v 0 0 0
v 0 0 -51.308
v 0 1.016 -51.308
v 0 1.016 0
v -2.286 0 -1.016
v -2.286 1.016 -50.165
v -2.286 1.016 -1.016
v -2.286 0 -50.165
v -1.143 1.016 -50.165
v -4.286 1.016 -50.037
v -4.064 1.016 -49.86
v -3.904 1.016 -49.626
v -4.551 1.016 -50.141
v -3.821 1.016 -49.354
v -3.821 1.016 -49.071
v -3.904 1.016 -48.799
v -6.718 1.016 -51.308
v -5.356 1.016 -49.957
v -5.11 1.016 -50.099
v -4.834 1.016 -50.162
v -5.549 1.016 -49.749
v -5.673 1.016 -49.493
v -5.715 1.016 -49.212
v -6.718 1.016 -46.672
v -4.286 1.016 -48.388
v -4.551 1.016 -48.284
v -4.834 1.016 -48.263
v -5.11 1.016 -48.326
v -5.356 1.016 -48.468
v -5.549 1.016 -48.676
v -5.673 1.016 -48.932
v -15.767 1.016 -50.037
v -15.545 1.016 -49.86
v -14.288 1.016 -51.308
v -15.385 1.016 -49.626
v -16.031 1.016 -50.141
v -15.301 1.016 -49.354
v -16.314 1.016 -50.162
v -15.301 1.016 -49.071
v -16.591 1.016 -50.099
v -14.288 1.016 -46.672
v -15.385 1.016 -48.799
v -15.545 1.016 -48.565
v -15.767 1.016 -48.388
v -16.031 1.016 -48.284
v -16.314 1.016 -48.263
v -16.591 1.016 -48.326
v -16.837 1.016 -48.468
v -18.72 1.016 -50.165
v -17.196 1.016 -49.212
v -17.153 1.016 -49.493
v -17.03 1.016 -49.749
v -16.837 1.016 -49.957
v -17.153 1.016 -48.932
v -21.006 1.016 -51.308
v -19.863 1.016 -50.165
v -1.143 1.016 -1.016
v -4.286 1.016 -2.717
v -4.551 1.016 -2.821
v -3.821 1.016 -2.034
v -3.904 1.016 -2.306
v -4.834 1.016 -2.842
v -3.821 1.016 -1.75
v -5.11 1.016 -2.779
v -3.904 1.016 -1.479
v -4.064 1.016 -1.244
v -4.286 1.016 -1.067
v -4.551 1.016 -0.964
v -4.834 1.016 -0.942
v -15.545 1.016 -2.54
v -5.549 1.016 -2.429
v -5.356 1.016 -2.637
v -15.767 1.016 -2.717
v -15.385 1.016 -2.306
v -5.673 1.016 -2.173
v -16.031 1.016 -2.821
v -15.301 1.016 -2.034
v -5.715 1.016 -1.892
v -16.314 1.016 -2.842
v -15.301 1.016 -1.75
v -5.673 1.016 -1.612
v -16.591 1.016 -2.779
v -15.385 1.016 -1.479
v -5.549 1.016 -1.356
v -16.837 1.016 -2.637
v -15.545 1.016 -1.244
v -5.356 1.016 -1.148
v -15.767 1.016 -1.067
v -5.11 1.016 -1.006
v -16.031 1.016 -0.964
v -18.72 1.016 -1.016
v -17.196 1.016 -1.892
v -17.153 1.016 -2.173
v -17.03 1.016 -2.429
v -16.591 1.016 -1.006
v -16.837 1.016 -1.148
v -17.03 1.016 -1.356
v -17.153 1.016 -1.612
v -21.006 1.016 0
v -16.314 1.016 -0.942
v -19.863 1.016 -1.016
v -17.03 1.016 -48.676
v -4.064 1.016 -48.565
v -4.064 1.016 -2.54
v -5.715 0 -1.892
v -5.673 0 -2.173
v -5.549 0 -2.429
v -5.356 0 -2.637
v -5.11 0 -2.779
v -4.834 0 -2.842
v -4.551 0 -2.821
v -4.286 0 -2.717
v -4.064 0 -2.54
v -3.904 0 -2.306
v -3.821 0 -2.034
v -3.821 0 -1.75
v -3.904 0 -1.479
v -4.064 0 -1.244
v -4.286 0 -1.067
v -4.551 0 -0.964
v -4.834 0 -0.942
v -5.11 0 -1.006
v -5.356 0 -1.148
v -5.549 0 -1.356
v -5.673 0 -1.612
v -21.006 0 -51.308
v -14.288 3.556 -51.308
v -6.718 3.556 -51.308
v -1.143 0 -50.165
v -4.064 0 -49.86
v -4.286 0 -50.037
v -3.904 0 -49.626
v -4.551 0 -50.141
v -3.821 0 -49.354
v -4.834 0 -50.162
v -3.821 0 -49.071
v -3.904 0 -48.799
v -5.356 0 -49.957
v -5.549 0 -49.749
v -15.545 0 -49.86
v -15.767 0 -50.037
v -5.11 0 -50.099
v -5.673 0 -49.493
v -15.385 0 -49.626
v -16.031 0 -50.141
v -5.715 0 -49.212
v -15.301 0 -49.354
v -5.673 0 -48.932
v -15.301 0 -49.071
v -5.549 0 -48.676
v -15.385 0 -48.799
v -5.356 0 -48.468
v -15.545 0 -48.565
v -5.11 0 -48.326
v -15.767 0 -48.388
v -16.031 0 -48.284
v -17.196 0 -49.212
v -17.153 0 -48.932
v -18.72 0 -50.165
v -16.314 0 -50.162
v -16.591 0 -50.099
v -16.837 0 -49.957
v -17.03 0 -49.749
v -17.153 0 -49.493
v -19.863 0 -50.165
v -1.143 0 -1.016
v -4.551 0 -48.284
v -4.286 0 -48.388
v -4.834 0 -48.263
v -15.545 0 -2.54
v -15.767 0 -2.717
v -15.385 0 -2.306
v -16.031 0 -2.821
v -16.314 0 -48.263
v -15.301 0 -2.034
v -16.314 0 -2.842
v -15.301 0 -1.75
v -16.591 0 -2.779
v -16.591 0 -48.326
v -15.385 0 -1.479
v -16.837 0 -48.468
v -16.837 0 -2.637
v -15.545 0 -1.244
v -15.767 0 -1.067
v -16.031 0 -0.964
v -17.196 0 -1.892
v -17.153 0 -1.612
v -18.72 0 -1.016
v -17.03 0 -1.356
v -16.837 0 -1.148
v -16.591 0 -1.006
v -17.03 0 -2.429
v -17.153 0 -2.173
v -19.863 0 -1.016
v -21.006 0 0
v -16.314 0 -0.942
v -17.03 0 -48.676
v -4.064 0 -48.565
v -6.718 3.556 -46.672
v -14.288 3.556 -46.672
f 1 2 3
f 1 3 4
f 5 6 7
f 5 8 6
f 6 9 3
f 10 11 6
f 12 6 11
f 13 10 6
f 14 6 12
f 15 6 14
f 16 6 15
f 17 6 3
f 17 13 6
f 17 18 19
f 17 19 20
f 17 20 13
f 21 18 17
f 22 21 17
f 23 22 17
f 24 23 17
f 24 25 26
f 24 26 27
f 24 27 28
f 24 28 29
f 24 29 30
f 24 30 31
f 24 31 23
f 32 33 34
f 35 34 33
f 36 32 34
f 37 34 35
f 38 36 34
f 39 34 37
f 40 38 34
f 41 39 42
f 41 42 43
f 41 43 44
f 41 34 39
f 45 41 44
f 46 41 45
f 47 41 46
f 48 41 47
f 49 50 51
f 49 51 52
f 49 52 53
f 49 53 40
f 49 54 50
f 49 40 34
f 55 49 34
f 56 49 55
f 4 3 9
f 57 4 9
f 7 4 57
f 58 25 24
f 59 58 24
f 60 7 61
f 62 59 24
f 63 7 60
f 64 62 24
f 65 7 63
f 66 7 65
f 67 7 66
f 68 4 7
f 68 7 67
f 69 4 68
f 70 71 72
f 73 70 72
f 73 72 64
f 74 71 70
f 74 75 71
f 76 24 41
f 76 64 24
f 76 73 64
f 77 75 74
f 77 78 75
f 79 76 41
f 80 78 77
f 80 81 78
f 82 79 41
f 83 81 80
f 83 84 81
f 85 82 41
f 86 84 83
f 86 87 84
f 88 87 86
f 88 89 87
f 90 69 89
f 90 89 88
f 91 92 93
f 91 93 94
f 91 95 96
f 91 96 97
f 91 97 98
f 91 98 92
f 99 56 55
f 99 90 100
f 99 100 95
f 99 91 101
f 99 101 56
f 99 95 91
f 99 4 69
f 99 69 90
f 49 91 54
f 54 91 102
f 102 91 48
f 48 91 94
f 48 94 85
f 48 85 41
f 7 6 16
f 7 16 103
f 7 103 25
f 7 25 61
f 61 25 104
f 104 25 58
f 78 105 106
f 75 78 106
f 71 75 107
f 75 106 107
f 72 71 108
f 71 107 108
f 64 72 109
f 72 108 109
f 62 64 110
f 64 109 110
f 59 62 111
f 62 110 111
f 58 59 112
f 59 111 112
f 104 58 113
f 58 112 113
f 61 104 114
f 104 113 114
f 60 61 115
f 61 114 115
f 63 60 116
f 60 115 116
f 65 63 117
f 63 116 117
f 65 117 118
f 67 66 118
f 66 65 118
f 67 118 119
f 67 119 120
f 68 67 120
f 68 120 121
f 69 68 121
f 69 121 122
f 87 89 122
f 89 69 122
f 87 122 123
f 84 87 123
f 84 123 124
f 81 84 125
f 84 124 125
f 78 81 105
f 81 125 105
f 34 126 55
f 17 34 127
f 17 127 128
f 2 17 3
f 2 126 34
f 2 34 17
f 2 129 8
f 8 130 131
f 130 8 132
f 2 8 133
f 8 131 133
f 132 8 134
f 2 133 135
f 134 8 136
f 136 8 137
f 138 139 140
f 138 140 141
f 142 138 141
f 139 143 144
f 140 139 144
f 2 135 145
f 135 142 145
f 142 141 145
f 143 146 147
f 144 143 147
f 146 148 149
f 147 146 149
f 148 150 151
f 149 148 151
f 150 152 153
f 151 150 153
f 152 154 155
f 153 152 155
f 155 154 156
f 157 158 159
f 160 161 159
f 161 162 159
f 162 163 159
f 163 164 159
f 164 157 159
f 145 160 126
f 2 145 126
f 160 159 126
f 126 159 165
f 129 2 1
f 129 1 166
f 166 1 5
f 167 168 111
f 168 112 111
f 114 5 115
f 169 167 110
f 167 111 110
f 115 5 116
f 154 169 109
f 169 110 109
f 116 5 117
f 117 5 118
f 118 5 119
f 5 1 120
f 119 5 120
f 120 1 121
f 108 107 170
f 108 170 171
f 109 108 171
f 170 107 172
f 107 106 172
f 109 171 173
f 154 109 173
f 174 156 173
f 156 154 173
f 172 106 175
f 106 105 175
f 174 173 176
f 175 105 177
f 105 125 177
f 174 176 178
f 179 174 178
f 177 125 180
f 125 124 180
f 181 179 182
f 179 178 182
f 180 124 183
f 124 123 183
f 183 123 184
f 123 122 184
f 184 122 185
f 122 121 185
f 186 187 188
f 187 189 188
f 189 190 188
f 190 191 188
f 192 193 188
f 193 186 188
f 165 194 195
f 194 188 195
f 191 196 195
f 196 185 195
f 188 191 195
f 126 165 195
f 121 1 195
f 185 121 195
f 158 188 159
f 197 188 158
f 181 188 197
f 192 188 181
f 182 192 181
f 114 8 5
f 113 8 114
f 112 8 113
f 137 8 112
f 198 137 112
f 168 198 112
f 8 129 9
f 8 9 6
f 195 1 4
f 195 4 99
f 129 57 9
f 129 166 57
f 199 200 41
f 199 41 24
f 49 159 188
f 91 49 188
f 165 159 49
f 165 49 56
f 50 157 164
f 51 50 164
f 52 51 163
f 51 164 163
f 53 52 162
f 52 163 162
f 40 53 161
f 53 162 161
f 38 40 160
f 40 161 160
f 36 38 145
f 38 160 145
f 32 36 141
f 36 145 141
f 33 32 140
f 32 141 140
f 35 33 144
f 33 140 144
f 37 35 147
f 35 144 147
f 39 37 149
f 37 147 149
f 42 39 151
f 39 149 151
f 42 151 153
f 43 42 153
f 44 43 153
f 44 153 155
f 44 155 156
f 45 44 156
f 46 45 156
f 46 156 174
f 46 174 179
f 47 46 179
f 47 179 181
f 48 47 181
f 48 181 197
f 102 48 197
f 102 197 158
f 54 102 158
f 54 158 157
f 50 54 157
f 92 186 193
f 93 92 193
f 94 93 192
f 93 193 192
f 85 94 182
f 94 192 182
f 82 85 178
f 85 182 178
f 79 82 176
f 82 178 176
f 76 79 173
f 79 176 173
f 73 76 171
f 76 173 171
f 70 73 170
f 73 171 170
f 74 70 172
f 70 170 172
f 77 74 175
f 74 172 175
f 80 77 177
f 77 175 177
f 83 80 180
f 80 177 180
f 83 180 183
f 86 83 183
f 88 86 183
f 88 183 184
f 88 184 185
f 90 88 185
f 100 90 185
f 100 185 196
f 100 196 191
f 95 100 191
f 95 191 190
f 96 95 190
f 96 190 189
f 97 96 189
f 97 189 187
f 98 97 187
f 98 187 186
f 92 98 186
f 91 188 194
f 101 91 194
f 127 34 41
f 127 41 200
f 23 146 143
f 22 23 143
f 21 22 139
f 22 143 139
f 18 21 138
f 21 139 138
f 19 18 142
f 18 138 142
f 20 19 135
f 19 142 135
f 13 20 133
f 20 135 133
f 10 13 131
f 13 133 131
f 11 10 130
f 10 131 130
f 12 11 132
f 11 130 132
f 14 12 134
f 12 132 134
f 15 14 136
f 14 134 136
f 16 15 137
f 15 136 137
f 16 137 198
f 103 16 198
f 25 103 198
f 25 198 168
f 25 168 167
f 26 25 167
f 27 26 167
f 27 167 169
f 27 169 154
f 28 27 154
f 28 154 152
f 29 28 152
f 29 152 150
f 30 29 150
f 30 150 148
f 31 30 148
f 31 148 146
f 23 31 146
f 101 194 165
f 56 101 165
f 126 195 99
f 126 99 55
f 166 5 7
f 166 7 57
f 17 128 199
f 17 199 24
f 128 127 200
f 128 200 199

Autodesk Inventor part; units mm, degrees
ref_plane "YZ Plane" through (0, 0, 0) normal (1, 0, 0) x (0, 1, 0)
ref_plane "XZ Plane" through (0, 0, 0) normal (0, 1, 0) x (-1, 0, 0)
ref_plane "XY Plane" through (0, 0, 0) normal (0, 0, 1) x (1, 0, 0)
sketch "Sketch1" plane through (0, 0, 0) normal (0, 1, 0) x (-1, 0, 0)
  line L0 (0, 0) -> (21.0058, 0)
  line L1 (21.0058, 0) -> (21.0058, -51.308)
  line L2 (21.0058, -51.308) -> (0, -51.308)
  line L3 (0, -51.308) -> (0, 0)
  line L4 (21.0058, -51.308) -> (19.8628, -51.308)
  line L5 (19.8628, -51.308) -> (19.8628, -50.292)
  line L6 (19.8628, -50.292) -> (21.0058, -50.292)
  line L7 (21.0058, -50.292) -> (21.0058, -51.308)
  line L8 (21.0058, -25.654) -> (0, -25.654)
  line L9 (10.5029, -51.308) -> (10.5029, 0)
  line L10 (19.8628, 0) -> (19.8628, -1.016)
  line L11 (19.8628, -1.016) -> (21.0058, -1.016)
  line L12 (1.143, -51.308) -> (1.143, -50.292)
  line L13 (1.143, -50.292) -> (0, -50.292)
  line L14 (1.143, -1.016) -> (0, -1.016)
  line L15 (1.143, 0) -> (1.143, -1.016)
  line L16 (19.8628, -1.016) -> (19.8628, -50.292)
  line L17 (19.8628, -50.292) -> (18.7198, -50.292)
  line L18 (18.7198, -50.292) -> (18.7198, -1.016)
  line L19 (18.7198, -1.016) -> (19.8628, -1.016)
  line L20 (1.143, -1.016) -> (1.143, -50.292)
  line L21 (1.143, -50.292) -> (2.286, -50.292)
  line L22 (2.286, -50.292) -> (2.286, -1.016)
  line L23 (2.286, -1.016) -> (1.143, -1.016)
  line L24 (21.0058, 0) -> (17.1958, 0)
  line L25 (17.1958, 0) -> (17.1958, -0.9398)
  line L26 (17.1958, -0.9398) -> (21.0058, -0.9398)
  line L27 (21.0058, -0.9398) -> (21.0058, 0)
  line L28 (17.1958, -0.9398) -> (15.2908, -0.9398)
  line L29 (15.2908, -0.9398) -> (15.2908, -2.8448)
  line L30 (15.2908, -2.8448) -> (17.1958, -2.8448)
  line L31 (17.1958, -2.8448) -> (17.1958, -0.9398)
  circle A0 centre (16.2433, -1.8923) radius 0.9525
  circle A1 centre (4.7625, -1.8923) radius 0.9525
  line L32 (21.0058, -51.308) -> (0, -51.308)
  line L33 (0, -51.308) -> (0, -50.165)
  line L34 (0, -50.165) -> (21.0058, -50.165)
  line L35 (21.0058, -50.165) -> (21.0058, -51.308)
  line L36 (21.0058, -50.165) -> (17.1958, -50.165)
  line L37 (17.1958, -50.165) -> (15.2908, -50.165)
  line L38 (15.2908, -50.165) -> (15.2908, -48.26)
  line L39 (15.2908, -48.26) -> (17.1958, -48.26)
  line L40 (17.1958, -48.26) -> (17.1958, -50.165)
  circle A2 centre (16.2433, -49.2125) radius 0.9525
  circle A3 centre (4.7625, -49.2125) radius 0.9525
  point P0 (19.8628, -50.165)
  point P1 (18.7198, -50.165)
  point P2 (2.286, -50.165)
  point P3 (1.143, -50.165)
  dimension "d0" = 21.0058
  dimension "d1" = 51.308
  dimension "d2" = 1.143
  dimension "d3" = 1.016
  dimension "d4" = 1.143
  dimension "d7" = 3.81
  dimension "d8" = 0.9398
  dimension "d9" = 1.905
  dimension "d10" = 1.905
  dimension "d11" = 1.143
  dimension "d12" = 3.81
  dimension "d13" = 1.905
  dimension "d14" = 1.905
extrude "Extrusion1" add sketch "Sketch1" along normal blind 1.016 contours L0 L15 L14 L3 | L0 L9 L8 L22 L23 L15 | L14 L20 L8 L3 | L31 A0 L28 | L0 L25 L26 L10 L19 L18 L8 L9 | L8 L20 L34 L3 | L0 L10 L26 L25 | L9 L34 L22 L8 | L8 L18 L34 L40 L39 L38 L9 | L34 L20 L13 L3 | L0 L1 L26 L10 | L34 L18 L17 L5 L2 L9 | L9 L2 L12 L21 L22 L34 | L34 L22 L21 L20 | L13 L12 L2 L3 | L26 L1 L11 L10 | A0 L29 L28 | L31 L30 A0 | L16 L11 L1 L8 | L8 L1 L34 L16 | L34 L16 L17 L18 | L38 A2 L34 | A0 L30 L29 | L34 L1 L6 L16 | L34 A2 L40 | L5 L6 L1 L2 | L38 L39 A2 | A2 L39 L40
sketch "Sketch2" plane through (0, 1.016, 0) normal (0, 1, 0) x (1, 0, 0)
  line L0 (0, 51.308) -> (-21.0058, 51.308) projected
  line L1 (-10.5029, 51.308) -> (-14.2875, 51.308)
  line L2 (-14.2875, 51.308) -> (-14.2875, 49.2125)
  line L3 (-14.2875, 49.2125) -> (-10.5029, 49.2125)
  line L4 (-10.5029, 49.2125) -> (-10.5029, 51.308)
  line L5 (-21.0058, 51.308) -> (0, 51.308)
  line L6 (-6.7183, 51.308) -> (-6.7183, 49.2125)
  line L7 (-6.7183, 49.2125) -> (-10.5029, 49.2125)
  point P0 (0, 0)
extrude "Extrusion2" add sketch "Sketch2" along normal blind 2.54
sketch "Sketch3" plane through (-14.2875, 1.016, -49.2125) normal (0, 0, 1) x (1, 0, 0)
  line L0 (0, 2.54) -> (7.5692, 2.54) projected
  line L1 (7.5692, 0) -> (0, 0) projected
  line L2 (0, 2.54) -> (7.5692, 2.54)
  line L3 (7.5692, 2.54) -> (7.5692, 0)
  line L4 (7.5692, 0) -> (0, 0)
  line L5 (0, 0) -> (0, 2.54)
  point P0 (14.2875, -1.016)
extrude "Extrusion3" add sketch "Sketch3" along normal blind 2.54
properties part number "RaspPi-Pico"
